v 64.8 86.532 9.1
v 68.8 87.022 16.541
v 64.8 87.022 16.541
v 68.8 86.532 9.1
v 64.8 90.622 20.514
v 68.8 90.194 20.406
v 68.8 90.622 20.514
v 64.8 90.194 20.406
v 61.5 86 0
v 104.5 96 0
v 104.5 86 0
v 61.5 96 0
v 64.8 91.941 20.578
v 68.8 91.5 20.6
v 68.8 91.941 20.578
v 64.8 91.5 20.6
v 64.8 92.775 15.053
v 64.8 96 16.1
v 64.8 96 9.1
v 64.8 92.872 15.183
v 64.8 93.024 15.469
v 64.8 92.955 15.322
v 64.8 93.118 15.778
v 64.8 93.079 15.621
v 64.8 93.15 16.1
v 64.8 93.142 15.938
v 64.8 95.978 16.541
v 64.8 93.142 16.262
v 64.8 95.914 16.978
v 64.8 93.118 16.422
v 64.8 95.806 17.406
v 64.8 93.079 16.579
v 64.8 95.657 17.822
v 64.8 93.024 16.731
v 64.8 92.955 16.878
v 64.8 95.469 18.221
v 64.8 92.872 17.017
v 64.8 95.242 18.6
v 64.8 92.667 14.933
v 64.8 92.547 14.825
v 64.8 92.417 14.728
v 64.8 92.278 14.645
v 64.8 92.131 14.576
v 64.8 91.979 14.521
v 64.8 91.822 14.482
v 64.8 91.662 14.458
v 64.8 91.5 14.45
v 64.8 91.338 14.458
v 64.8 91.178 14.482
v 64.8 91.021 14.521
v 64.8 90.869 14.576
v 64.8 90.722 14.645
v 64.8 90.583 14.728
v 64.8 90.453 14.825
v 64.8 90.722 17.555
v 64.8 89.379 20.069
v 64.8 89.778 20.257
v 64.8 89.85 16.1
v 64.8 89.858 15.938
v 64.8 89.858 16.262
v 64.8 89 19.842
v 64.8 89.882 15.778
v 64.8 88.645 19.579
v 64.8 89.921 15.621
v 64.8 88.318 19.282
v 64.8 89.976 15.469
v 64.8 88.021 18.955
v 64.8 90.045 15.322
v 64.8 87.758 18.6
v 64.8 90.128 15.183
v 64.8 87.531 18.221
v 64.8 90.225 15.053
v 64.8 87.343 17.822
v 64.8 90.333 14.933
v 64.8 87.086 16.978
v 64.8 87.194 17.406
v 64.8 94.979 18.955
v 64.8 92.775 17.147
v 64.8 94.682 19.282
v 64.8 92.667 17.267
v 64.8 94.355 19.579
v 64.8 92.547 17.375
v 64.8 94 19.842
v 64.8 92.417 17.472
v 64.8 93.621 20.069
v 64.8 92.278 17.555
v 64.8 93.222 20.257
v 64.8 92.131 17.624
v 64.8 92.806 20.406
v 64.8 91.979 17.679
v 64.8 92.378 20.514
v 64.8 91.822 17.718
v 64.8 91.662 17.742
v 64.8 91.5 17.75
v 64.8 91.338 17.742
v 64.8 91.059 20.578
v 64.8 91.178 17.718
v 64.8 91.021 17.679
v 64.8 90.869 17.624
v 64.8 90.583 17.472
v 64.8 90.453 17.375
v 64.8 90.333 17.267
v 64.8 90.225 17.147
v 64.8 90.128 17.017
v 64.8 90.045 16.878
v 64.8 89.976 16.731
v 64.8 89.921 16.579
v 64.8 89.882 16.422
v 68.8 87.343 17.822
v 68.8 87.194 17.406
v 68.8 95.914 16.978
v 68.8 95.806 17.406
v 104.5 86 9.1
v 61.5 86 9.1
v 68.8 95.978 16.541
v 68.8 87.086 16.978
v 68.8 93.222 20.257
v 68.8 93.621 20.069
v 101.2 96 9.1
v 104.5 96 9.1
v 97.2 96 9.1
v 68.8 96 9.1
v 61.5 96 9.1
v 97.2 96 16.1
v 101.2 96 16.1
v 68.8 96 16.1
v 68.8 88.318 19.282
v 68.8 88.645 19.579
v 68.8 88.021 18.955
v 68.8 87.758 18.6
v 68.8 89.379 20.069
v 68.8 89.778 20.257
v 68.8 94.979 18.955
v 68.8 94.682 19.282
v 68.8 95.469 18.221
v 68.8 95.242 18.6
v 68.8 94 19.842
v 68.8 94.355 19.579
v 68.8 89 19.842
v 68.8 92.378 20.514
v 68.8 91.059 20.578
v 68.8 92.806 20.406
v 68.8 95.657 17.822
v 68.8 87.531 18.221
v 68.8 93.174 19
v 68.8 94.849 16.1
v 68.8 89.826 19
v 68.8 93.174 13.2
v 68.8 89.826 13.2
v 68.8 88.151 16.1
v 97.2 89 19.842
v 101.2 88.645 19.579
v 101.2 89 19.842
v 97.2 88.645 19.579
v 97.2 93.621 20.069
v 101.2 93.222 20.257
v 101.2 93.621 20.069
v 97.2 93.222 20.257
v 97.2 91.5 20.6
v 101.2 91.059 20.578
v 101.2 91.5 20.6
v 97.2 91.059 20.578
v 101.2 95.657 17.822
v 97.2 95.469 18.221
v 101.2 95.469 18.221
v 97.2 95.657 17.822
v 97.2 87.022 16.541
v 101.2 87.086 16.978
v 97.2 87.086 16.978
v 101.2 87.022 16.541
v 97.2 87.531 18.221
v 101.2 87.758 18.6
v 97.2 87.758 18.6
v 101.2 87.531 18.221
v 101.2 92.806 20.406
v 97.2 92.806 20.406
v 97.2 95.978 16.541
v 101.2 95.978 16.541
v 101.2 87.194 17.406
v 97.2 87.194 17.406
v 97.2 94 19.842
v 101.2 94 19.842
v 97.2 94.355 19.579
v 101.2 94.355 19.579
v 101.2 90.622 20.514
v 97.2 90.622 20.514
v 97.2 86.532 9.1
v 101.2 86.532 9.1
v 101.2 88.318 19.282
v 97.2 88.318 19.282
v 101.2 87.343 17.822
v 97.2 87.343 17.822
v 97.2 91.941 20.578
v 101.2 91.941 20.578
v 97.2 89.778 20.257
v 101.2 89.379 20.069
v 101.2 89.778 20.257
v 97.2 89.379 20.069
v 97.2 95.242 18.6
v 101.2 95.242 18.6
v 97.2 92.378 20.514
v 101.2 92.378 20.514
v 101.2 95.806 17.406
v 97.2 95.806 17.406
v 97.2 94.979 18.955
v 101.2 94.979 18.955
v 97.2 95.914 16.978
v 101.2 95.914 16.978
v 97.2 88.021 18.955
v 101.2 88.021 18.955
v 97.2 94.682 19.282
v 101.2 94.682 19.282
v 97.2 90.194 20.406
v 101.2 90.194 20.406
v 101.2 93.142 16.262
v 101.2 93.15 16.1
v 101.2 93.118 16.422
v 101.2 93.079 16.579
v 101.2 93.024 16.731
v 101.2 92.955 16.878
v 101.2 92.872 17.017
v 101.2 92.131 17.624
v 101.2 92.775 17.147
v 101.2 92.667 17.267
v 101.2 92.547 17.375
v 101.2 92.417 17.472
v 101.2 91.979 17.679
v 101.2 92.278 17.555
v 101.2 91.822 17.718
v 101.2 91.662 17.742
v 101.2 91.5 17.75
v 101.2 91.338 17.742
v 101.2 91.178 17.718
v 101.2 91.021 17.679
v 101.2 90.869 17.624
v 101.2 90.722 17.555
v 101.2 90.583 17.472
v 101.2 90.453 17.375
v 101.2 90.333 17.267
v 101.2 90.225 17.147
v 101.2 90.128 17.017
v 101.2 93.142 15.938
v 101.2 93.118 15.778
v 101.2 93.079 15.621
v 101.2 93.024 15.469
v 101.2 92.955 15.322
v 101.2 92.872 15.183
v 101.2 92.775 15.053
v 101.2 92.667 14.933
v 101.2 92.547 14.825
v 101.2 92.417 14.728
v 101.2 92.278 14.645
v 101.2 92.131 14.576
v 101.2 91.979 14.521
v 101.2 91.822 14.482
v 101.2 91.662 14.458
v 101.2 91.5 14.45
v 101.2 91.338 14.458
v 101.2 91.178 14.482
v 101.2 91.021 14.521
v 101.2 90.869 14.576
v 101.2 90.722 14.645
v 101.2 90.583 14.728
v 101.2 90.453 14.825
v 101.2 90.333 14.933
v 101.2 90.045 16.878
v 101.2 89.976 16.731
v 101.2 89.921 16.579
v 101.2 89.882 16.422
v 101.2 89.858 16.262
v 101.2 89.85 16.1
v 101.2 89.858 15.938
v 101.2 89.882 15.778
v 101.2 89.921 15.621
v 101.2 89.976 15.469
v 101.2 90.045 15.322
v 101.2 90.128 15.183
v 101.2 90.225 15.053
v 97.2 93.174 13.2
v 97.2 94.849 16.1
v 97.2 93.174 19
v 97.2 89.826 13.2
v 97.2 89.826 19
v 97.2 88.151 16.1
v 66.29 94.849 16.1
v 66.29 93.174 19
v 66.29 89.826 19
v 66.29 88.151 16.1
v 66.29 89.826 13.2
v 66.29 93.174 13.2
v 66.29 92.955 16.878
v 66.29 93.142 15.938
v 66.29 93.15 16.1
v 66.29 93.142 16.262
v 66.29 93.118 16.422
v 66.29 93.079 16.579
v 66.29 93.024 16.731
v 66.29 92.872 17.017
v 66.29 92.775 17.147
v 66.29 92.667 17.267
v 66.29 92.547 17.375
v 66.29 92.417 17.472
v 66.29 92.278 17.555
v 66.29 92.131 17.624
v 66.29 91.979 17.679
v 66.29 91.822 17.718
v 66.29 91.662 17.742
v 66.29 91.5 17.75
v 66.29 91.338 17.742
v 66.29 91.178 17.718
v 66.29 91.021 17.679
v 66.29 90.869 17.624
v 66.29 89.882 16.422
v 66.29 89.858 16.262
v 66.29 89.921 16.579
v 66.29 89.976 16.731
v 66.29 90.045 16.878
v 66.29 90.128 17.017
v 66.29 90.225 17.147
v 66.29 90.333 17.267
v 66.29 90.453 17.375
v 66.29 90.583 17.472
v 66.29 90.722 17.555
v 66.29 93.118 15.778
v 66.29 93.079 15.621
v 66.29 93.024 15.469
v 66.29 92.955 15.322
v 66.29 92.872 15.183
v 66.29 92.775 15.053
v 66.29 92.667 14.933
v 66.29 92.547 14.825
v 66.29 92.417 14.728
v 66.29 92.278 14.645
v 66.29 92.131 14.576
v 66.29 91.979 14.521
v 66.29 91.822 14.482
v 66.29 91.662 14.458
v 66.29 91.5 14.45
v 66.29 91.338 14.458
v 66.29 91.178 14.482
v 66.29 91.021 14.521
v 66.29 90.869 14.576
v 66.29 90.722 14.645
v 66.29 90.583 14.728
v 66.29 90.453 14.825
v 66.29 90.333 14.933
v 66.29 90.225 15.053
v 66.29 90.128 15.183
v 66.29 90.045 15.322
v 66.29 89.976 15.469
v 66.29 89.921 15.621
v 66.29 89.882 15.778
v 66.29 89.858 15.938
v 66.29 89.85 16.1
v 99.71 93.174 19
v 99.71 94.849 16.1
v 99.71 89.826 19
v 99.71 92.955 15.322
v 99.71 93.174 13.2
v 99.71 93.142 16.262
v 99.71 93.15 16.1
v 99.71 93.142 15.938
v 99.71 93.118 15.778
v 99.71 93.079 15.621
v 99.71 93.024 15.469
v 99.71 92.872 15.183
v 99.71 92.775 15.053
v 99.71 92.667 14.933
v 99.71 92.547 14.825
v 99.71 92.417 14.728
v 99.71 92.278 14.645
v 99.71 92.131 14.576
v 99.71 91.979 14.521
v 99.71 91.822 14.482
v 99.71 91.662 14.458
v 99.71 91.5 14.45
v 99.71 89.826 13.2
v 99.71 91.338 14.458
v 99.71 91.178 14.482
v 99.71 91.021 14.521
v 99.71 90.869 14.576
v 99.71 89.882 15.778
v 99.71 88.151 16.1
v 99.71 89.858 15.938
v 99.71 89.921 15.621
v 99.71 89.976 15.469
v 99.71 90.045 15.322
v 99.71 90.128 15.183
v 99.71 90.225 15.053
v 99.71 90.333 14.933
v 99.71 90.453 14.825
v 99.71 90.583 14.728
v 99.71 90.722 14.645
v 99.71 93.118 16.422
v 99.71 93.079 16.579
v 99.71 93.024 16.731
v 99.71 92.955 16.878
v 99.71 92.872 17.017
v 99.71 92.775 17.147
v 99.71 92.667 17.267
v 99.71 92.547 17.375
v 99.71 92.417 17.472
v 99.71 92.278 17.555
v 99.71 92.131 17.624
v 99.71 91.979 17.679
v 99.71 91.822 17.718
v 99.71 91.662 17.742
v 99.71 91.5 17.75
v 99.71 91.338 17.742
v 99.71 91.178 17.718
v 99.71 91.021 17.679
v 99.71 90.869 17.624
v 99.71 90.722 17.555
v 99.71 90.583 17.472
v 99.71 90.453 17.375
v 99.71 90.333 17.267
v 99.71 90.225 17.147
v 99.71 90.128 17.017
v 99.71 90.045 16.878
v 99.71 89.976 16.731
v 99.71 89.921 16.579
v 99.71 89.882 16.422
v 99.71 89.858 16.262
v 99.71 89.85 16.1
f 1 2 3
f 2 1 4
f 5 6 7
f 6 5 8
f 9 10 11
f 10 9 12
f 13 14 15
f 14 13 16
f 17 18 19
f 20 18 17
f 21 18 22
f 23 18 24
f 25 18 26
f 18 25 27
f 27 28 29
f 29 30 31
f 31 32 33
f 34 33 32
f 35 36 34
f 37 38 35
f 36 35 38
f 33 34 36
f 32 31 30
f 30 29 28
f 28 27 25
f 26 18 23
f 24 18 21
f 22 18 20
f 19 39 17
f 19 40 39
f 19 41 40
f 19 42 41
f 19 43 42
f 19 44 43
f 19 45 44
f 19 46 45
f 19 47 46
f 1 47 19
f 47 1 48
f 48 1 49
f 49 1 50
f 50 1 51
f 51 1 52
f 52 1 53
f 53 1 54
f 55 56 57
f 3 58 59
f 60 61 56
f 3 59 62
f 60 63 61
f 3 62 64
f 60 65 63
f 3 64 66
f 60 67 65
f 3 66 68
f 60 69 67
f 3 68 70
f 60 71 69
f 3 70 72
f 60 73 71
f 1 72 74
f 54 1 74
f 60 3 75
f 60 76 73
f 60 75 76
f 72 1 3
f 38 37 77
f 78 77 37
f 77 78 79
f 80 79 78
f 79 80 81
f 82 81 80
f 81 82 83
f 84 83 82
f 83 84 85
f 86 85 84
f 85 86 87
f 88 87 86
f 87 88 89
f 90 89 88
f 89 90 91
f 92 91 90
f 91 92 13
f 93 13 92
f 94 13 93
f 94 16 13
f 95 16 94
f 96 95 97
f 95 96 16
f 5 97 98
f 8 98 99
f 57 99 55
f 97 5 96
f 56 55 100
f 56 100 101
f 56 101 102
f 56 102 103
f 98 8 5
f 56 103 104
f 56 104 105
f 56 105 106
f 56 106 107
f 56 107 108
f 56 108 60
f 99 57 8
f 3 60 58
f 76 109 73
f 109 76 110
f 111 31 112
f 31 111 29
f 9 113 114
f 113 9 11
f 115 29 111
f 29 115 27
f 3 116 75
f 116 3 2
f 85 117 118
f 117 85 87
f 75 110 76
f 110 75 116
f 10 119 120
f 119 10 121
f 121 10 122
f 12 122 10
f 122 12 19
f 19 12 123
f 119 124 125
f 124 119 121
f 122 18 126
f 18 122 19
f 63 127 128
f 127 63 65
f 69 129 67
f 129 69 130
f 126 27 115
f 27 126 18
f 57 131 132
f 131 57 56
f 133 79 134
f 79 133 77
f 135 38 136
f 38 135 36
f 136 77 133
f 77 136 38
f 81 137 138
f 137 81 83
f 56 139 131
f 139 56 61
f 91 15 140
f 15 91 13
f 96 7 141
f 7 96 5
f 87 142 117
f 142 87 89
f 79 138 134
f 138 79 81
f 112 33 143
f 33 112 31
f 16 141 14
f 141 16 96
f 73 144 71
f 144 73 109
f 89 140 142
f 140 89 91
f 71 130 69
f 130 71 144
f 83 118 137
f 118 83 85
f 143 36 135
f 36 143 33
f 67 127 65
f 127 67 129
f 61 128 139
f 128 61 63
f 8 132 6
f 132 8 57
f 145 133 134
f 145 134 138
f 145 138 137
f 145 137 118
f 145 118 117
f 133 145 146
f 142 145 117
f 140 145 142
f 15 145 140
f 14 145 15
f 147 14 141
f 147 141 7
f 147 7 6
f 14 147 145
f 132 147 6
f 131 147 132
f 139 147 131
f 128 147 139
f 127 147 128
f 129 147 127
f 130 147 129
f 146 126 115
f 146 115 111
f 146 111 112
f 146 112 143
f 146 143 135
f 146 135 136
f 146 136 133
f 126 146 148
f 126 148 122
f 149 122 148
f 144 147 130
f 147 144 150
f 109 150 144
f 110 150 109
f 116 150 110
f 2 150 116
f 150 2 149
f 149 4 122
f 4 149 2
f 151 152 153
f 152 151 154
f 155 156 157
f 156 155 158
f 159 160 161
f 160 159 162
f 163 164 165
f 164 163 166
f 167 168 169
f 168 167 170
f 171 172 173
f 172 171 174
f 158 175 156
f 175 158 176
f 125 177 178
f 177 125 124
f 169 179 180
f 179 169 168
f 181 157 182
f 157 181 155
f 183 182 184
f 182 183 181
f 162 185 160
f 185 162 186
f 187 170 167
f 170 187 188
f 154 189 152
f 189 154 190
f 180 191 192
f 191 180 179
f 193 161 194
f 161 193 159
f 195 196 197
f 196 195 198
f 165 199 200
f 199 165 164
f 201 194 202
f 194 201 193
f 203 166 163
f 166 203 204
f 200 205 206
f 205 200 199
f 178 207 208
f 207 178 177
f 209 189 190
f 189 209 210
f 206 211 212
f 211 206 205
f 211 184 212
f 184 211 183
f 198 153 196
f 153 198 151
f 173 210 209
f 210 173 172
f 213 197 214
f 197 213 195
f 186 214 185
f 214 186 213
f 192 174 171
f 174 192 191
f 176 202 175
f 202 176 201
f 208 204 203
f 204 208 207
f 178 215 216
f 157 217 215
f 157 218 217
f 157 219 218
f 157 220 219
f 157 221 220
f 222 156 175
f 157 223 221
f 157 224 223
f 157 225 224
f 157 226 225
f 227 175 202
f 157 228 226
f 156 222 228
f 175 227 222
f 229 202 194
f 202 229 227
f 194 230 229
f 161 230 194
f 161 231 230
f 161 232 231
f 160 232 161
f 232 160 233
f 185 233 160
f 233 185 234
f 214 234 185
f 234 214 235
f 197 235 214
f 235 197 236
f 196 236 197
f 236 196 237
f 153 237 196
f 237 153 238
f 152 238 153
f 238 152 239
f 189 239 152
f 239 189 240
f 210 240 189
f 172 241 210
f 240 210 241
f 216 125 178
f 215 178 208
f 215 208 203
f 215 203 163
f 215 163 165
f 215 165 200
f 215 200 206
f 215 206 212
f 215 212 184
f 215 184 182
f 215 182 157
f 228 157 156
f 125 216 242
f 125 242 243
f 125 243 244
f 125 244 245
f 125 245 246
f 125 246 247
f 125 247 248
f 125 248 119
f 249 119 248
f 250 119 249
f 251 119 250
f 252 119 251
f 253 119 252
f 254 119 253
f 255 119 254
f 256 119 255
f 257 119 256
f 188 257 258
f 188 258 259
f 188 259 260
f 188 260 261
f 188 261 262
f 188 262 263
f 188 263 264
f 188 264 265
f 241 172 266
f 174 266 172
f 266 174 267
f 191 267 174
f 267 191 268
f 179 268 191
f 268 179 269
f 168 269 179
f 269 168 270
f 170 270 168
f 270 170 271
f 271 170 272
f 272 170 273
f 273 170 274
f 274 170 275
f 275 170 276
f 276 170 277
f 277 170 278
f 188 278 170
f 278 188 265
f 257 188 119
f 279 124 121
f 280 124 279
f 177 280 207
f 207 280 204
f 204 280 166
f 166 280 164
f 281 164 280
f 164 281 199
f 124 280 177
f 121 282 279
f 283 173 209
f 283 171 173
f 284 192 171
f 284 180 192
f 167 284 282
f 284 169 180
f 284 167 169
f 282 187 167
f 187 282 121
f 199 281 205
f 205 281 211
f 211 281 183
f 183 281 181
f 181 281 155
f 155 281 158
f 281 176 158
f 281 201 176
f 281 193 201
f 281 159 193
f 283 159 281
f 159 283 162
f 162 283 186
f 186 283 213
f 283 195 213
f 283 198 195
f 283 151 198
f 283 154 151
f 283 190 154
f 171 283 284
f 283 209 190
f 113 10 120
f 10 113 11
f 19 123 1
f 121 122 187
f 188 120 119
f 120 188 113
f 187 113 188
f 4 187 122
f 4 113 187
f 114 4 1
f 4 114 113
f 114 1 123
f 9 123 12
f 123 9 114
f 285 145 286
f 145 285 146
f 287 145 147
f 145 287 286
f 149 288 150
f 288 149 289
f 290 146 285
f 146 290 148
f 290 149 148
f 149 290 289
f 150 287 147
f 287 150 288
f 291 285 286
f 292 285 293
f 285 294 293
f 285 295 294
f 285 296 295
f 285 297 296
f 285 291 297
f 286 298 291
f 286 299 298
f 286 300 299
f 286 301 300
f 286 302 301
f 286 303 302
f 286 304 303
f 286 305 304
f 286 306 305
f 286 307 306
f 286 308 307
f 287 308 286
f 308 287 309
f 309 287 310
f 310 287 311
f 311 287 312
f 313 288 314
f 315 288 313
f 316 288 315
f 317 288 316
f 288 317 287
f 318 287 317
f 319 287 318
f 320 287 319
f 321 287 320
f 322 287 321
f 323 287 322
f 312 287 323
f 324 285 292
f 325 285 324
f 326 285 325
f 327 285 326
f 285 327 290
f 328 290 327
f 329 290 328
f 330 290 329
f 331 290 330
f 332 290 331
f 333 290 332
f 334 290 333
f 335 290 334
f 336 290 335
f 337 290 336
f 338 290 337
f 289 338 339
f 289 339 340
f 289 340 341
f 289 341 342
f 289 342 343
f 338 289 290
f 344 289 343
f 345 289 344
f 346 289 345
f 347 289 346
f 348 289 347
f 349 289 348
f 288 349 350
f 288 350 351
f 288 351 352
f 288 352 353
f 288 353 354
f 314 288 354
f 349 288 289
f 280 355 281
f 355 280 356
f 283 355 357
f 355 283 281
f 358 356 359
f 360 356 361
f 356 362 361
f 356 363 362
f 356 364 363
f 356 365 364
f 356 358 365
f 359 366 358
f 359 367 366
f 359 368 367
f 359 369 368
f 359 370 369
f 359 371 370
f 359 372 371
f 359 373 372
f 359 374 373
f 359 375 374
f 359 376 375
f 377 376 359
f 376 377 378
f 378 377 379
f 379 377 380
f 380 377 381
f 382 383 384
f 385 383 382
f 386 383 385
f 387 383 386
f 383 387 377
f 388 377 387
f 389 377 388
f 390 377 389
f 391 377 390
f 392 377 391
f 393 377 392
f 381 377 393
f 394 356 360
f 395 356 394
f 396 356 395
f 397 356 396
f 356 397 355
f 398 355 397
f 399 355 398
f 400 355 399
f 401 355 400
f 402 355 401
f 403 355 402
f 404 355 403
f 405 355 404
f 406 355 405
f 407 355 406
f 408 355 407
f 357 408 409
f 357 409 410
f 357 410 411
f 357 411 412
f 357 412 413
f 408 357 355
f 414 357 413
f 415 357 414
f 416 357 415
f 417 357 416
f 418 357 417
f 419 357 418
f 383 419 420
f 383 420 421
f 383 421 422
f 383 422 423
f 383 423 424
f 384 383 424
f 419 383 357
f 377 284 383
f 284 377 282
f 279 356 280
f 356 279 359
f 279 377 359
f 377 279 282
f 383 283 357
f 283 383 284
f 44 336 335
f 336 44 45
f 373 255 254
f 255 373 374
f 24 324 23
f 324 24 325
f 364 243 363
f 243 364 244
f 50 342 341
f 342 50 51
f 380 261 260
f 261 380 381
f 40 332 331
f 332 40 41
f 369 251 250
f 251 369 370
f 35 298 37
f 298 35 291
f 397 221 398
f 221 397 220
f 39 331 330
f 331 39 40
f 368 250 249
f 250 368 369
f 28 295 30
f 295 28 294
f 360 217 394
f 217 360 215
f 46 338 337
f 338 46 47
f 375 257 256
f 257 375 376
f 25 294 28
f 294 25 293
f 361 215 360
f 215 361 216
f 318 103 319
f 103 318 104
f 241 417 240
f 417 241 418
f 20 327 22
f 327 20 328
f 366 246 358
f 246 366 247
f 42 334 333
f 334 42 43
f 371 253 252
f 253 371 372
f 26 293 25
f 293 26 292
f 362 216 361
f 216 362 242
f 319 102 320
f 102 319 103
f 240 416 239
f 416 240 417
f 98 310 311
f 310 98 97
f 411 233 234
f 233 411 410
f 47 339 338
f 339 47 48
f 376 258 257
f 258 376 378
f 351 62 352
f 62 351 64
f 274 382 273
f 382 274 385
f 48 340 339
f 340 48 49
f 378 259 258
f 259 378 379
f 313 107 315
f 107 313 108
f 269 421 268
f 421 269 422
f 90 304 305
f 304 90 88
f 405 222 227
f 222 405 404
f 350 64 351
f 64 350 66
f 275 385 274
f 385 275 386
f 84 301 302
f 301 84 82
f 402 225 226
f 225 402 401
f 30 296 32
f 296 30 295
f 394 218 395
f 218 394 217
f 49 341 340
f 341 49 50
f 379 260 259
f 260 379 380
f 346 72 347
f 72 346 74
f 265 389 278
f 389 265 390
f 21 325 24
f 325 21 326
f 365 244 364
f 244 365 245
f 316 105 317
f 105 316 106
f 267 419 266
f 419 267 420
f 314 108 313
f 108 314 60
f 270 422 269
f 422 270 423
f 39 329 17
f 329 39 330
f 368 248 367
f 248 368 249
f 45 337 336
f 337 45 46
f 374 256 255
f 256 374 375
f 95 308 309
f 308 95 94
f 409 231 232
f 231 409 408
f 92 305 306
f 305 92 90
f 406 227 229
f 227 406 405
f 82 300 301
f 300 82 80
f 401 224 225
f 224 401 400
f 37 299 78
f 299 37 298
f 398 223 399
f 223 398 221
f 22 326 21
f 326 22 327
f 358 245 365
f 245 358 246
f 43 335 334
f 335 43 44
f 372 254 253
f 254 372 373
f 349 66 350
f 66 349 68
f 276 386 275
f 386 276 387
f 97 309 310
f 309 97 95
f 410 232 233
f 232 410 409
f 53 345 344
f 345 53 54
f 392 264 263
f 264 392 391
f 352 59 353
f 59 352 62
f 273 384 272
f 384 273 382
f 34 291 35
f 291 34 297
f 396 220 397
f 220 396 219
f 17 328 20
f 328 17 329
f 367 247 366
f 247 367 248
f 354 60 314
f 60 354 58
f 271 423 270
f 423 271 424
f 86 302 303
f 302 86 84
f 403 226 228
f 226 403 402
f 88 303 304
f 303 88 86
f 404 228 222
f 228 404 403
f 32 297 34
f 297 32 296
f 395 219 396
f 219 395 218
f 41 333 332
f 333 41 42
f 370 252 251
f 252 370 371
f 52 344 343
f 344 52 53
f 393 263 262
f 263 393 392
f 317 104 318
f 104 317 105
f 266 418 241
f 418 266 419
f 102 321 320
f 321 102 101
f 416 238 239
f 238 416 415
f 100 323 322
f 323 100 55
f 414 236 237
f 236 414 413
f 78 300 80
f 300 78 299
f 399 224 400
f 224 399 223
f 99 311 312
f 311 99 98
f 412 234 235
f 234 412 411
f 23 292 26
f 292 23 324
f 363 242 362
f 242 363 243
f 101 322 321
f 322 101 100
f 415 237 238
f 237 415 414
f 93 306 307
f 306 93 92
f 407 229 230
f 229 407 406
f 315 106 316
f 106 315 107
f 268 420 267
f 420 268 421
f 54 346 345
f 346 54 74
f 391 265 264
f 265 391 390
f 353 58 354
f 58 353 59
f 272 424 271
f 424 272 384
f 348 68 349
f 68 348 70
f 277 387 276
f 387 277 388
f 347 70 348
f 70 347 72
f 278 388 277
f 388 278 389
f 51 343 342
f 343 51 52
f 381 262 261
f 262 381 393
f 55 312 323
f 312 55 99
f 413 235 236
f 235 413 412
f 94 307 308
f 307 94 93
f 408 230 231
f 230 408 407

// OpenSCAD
// file: kagu_top.scad
// Kagu top plate -- the switch plate and the short skirt that carries it, one
// part that sits on the bottom tray's border and closes the case.
//
// This file expects the geometry file and kagu_tray.scad to be included first:
// the plate reuses the tray's stack heights and its 2D profiles, so the skirt
// lands exactly on the border, cable swell included. See case/left_top.scad
// and case/right_top.scad.
//
// The same five M3 screws that hold the PCB now clamp plate, PCB and tray
// together: each runs through a spacer under the plate, then the PCB, into the
// tray's heat-set insert. The PCB mounting holes are DIN 965 footprints, so the
// plate is countersunk for flat-head screws that finish flush. M3 x 8 is right
// for the stack below; anything longer bottoms out in the insert hole.

// ---------------------------------------------------------------------------
// Vertical stack, on top of the tray's (which ends at the PCB top face).
// ---------------------------------------------------------------------------
pcb_to_plate = 2.2;   // PCB top -> plate underside, set by the Choc switch body
plate_t      = 1.3;   // Choc clips want 1.2-1.3mm
skirt_gap    = 1.0;   // the skirt stops this far above the tray border, so the
                      // screws clamp plate, switches and PCB together instead of
                      // the skirt landing on the border first (on the first print
                      // some hotswap sockets lost contact). The screw spacers
                      // stop at the same height.

// ---------------------------------------------------------------------------
// Openings
// ---------------------------------------------------------------------------
switch_cut   = 13.8;  // Kailh Choc v1/v2 plate cutout
window_clear = 0.4;   // margin around the XIAO

// ---------------------------------------------------------------------------
// Fasteners -- countersunk M3 (DIN 965 / ISO 7046), 90 degree head.
// ---------------------------------------------------------------------------
spacer_d      = 6.0;  // sits on the 6mm mounting-hole pad, clear of the parts
screw_clear_d = 3.4;
csk_d         = 6.2;  // head diameter plus a little, so it lands flush

// ---------------------------------------------------------------------------
// Supports -- pillars from the plate down onto the PCB so it does not flex
// under typing. Left-half coordinates, mirrored for the right half (the boards
// are mirror images). Three per column gap, where they clear the switch
// latches by 0.5mm, plus the open stretches round the thumb cluster, beside
// the outer columns and next to the battery connector. All land on bare PCB: the diodes and hotswap
// sockets are on the back, and none of these spots touch a front pad.
// ---------------------------------------------------------------------------
use_supports = true;   // they stop skirt_gap short of the PCB, like the skirt
                       // and the screw spacers, so they cannot hold the PCB
                       // off the switch pins
support_d = 2.4;
supports  = [
    [24, 39.5], [24, 53.5], [24, 67.5],
    [42, 45.6], [42, 62.5], [42, 79.4],
    [60, 45.6], [60, 62.0], [60, 78.4],
    [78, 38.6], [78, 57.5], [78, 76.4],
    [57, 35], [80, 30], [95, 28], [98, 40], [97, 57], [97, 72],
    [110, 32.3], [4, 47],
];

// Same web cleanup as the old one-piece case: the battery-LED connector lands
// 0.35mm from the SW16 cutout, so opening its window leaves a sliver too thin
// to print. Opening the
// profile by min_web deletes any web thinner than 2*min_web and leaves the
// rest alone. Set to 0 to disable.
min_web = 0.3;

// ---------------------------------------------------------------------------
// Derived
// ---------------------------------------------------------------------------
plate_z = tray_h + pcb_to_plate;   // plate underside
top_h   = pcb_to_plate + plate_t;  // overall height of this part
support_pts = !use_supports ? []
            : chip_right ? supports : [for (p = supports) [board_w - p[0], p[1]]];

echo(str("top: skirt ", pcb_to_plate, " + plate ", plate_t, " = ", top_h,
         "mm,  case ", tray_h + top_h, "mm tall assembled,  screws M3 x 8 csk"));

// ---------------------------------------------------------------------------
// 2D
// ---------------------------------------------------------------------------
module rect(r, c = 0) {
    translate([r[0] - c, r[1] - c])
        square([r[2] - r[0] + 2 * c, r[3] - r[1] + 2 * c]);
}

// The case outline the plate covers. kagu_screen.scad can set `plate_cut`
// [x, y]: everything past both is left to the screen base on the left half.
module top_shell_2d() {
    difference() {
        shell_2d();
        if (!is_undef(plate_cut)) translate(plate_cut) square(big);
    }
}

module plate_profile() {
    difference() {
        top_shell_2d();

        for (s = switches)
            translate([s[0], s[1]])
                rotate(s[2])
                    square(switch_cut, center = true);

        // No windows over the JST footprints (tall_parts): none are fitted, and a
        // header would hit the plate. Cut the windows again with
        // `for (t = tall_parts) rect(t, window_clear);` when the ledge is wired.

        // Open bay over the XIAO: clears the module however deep it seats, and
        // lets its RGB status LED show.
        rect(xiao, window_clear);
    }
}

// ---------------------------------------------------------------------------
// Assembly -- modelled in place on top of the tray; printed upside down.
// ---------------------------------------------------------------------------
module top_plate_in_place() {
    difference() {
        union() {
            // skirt, the same skin as the tray border
            translate([0, 0, tray_h + skirt_gap])
                linear_extrude(pcb_to_plate - skirt_gap)
                    difference() { top_shell_2d(); cavity_2d(); }
            translate([0, 0, plate_z])
                linear_extrude(plate_t)
                    if (min_web > 0) offset(r = min_web) offset(r = -min_web) plate_profile();
                    else plate_profile();
            // spacers that let the screws clamp the plate down onto the PCB
            for (p = concat(screws, ledge_pts()))
                translate([p[0], p[1], tray_h + skirt_gap])
                    cylinder(d = spacer_d, h = top_h - skirt_gap);
            for (p = support_pts)
                translate([p[0], p[1], tray_h + skirt_gap])
                    cylinder(d = support_d, h = top_h - skirt_gap);
        }
        for (p = concat(screws, ledge_pts()))
            translate([p[0], p[1], 0]) {
                translate([0, 0, tray_h - eps])
                    cylinder(d = screw_clear_d, h = top_h + 2 * eps);
                // 90 degree countersink, flush with the plate top
                translate([0, 0, plate_z + plate_t - csk_d / 2 + eps])
                    cylinder(d1 = 0, d2 = csk_d, h = csk_d / 2);
            }
        // USB-C: the tray's notch, carried through the skirt and the plate.
        translate([0, 0, tray_h - eps])
            linear_extrude(top_h + 2 * eps) usb_slot_2d();
    }
}

// Plate face down on the bed: the visible surface comes off the build plate
// smooth, and the skirt and spacers print upward without supports.
module top_plate() {
    translate([0, 0, tray_h + top_h])
        rotate([180, 0, 0])
            top_plate_in_place();
}
// file: kagu_left_geom.scad
// GENERATED by case/extract_geometry.py -- do not edit.
// Source: pcb/kagu-left/kagu.kicad_pcb

board_w = 127;
board_h = 91.5;

// Board outline, counter-clockwise, origin at bounding-box corner.
outline = [ [0, 76.5], [0, 22], [26, 22], [30, 34], [41.5, 34], [53.5, 12.5], [72.5, 12.5], [106, 0], [127, 37], [127, 82.5], [77.5, 82.5], [77.5, 84.5], [61.5, 84.5], [61.5, 91.5], [40.5, 91.5], [40.5, 85.5], [22.5, 85.5], [22.5, 76.5] ];

// M3 mounting holes.
screws = [ [122, 35.5], [45, 35.5], [3.5, 25.5], [3.5, 73], [123.5, 79] ];

// Switch centres as [x, y, rotation].
switches = [ [15, 64.5, -0], [63, 21.5, -180], [87, 39.5, -0], [69, 41.5, -0], [51, 48.5, -0], [33, 76.5, -0], [51, 82.5, -0], [104, 15.5, 120], [87, 56.5, -0], [69, 75.5, -0], [83, 18.5, -160], [69, 58.5, -0], [87, 73.5, -0], [33, 59.5, -0], [15, 30.5, -0], [15, 47.5, -0], [51, 65.5, -0], [33, 42.5, -0] ];

// Components taller than the plate gap: [x0, y0, x1, y1].
tall_parts = [
    [111.5, 39.6, 119.5, 47.2],  // Switch_Con1
    [101.5, 39.6, 109.5, 47.2],  // Bat_Con1
    [103, 24.98, 108.7, 30.57],  // Bat_LED_Con1
];

// XIAO board cutout [x0, y0, x1, y1].
xiao = [101.8, 59.99, 119.6, 80.95];

// USB-C connector envelope [x0, y0, x1, y1].
usb = [106.2, 81.04, 115.2, 82.55];

// Reset button centre.
reset = [116, 32.5];
// main file
// Entry point for the folding screen's base, glued behind the left case's far
// wall. Printed standing on its bottom. Render with:
//   openscad -o build/kagu_left_screen_base.stl case/left_screen_base.scad
include <kagu_left_geom.scad>
include <kagu_tray.scad>
include <kagu_top.scad>
include <kagu_screen.scad>

screen_base();
